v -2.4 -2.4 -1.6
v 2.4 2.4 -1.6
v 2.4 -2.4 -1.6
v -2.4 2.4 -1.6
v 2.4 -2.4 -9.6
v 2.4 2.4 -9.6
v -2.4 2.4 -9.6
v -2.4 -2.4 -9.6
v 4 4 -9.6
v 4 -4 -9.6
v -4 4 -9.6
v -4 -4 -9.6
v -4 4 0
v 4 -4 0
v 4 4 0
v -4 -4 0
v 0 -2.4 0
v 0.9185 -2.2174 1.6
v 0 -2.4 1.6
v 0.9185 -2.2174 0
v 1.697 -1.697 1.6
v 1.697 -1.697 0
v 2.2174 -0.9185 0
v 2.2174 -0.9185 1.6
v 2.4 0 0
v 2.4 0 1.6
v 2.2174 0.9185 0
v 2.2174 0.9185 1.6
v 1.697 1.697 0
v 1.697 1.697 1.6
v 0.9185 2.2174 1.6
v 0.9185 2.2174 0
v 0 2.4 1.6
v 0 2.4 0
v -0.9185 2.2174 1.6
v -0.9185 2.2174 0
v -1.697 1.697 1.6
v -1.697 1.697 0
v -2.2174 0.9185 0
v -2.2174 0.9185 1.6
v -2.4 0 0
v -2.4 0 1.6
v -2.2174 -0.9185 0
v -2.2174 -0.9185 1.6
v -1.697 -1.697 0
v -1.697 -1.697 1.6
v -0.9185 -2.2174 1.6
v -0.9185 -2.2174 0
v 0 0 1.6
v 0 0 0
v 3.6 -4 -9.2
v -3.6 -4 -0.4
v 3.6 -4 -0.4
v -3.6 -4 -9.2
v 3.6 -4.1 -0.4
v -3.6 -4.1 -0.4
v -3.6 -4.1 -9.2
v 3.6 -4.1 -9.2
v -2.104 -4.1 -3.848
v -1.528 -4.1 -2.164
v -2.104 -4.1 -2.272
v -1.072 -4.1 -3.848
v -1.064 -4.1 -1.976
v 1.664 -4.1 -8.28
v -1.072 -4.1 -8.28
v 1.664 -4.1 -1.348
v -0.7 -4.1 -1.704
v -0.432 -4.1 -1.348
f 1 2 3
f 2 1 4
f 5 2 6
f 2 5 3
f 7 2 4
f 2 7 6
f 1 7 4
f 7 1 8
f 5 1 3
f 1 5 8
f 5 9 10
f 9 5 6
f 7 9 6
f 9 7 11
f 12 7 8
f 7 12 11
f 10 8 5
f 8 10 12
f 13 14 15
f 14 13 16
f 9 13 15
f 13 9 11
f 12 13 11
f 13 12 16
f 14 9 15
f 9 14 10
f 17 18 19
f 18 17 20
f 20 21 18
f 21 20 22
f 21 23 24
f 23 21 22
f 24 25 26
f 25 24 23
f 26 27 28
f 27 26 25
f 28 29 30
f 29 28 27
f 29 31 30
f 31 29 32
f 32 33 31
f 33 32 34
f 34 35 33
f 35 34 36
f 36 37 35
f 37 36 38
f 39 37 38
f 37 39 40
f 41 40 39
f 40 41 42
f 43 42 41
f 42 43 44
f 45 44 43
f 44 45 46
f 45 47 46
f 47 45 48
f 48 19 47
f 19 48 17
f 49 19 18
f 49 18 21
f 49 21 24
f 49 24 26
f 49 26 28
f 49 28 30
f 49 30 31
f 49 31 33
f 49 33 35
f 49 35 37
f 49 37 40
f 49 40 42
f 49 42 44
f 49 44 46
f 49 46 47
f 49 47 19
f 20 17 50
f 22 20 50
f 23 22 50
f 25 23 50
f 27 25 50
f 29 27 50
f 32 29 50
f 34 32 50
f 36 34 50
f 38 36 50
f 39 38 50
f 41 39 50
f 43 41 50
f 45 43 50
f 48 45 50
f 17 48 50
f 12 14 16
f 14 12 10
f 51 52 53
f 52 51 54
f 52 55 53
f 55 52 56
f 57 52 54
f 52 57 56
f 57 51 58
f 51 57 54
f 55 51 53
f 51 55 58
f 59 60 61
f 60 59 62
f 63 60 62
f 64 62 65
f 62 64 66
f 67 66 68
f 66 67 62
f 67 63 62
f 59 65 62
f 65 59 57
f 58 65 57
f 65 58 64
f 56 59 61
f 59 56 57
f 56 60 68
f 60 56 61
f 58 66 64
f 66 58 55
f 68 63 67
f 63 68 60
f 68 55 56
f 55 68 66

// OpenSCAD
// file: ../p/4-4edge.scad
use <../lib.scad>
function ldraw_lib__4_4edge() = [
// 0 Circle 1.0
// 0 Name: 4-4edge.dat
// 0 Author: James Jessiman
// 0 !LDRAW_ORG Primitive UPDATE 2017-01
// 0 !LICENSE Licensed under CC BY 2.0 and CC BY 4.0 : see CAreadme.txt
// 
// 0 BFC CERTIFY CCW
  [0,"BFC","CERTIFY"],
  [0,"BFC","CCW"],
// 
// 0 !HISTORY 1998-12-15 [PTadmin] Official Update 1998-10
// 0 !HISTORY 2005-12-28 [PTadmin] Official Update 2005-01
// 0 !HISTORY 2007-06-24 [PTadmin] Header formatted for Contributor Agreement
// 0 !HISTORY 2008-07-01 [PTadmin] Official Update 2008-01
// 0 !HISTORY 2017-01-15 [Steffen] BFCed
// 0 !HISTORY 2017-12-30 [PTadmin] Official Update 2017-01
// 
// 
// 2 24 1 0 0 0.9239 0 0.3827
  [2,24,1,0,0,0.9239,0,0.3827],
// 2 24 0.9239 0 0.3827 0.7071 0 0.7071
  [2,24,0.9239,0,0.3827,0.7071,0,0.7071],
// 2 24 0.7071 0 0.7071 0.3827 0 0.9239
  [2,24,0.7071,0,0.7071,0.3827,0,0.9239],
// 2 24 0.3827 0 0.9239 0 0 1
  [2,24,0.3827,0,0.9239,0,0,1],
// 2 24 0 0 1 -0.3827 0 0.9239
  [2,24,0,0,1,-0.3827,0,0.9239],
// 2 24 -0.3827 0 0.9239 -0.7071 0 0.7071
  [2,24,-0.3827,0,0.9239,-0.7071,0,0.7071],
// 2 24 -0.7071 0 0.7071 -0.9239 0 0.3827
  [2,24,-0.7071,0,0.7071,-0.9239,0,0.3827],
// 2 24 -0.9239 0 0.3827 -1 0 -0
  [2,24,-0.9239,0,0.3827,-1,0,-0],
// 2 24 -1 0 -0 -0.9239 0 -0.3827
  [2,24,-1,0,-0,-0.9239,0,-0.3827],
// 2 24 -0.9239 0 -0.3827 -0.7071 0 -0.7071
  [2,24,-0.9239,0,-0.3827,-0.7071,0,-0.7071],
// 2 24 -0.7071 0 -0.7071 -0.3827 0 -0.9239
  [2,24,-0.7071,0,-0.7071,-0.3827,0,-0.9239],
// 2 24 -0.3827 0 -0.9239 0 0 -1
  [2,24,-0.3827,0,-0.9239,0,0,-1],
// 2 24 0 0 -1 0.3827 0 -0.9239
  [2,24,0,0,-1,0.3827,0,-0.9239],
// 2 24 0.3827 0 -0.9239 0.7071 0 -0.7071
  [2,24,0.3827,0,-0.9239,0.7071,0,-0.7071],
// 2 24 0.7071 0 -0.7071 0.9239 0 -0.3827
  [2,24,0.7071,0,-0.7071,0.9239,0,-0.3827],
// 2 24 0.9239 0 -0.3827 1 0 0
  [2,24,0.9239,0,-0.3827,1,0,0],
];
module ldraw_lib__4_4edge(step=0, col=false, unit=2/5, alt=false, line=0.2, solid=!$preview)
    makepoly(ldraw_lib__4_4edge(), step=step, col=col, unit=unit, alt=alt, line=line, solid=solid);
ldraw_lib__4_4edge(line=0.2);
// file: ../p/4-4disc.scad
use <../lib.scad>
function ldraw_lib__4_4disc() = [
// 0 Disc 1.0
// 0 Name: 4-4disc.dat
// 0 Author: James Jessiman
// 0 !LDRAW_ORG Primitive UPDATE 2002-02
// 0 !LICENSE Licensed under CC BY 2.0 and CC BY 4.0 : see CAreadme.txt
// 
// 0 BFC CERTIFY CCW
  [0,"BFC","CERTIFY"],
  [0,"BFC","CCW"],
// 
// 0 !HISTORY 1998-12-15 [PTadmin] Official Update 1998-10
// 0 !HISTORY 2002-03-23 [sbliss] Added BFC statement
// 0 !HISTORY 2002-04-25 [PTadmin] Official Update 2002-02
// 0 !HISTORY 2007-06-24 [PTadmin] Header formatted for Contributor Agreement
// 0 !HISTORY 2008-07-01 [PTadmin] Official Update 2008-01
// 
// 
// 3 16 0 0 0 1 0 0 0.9239 0 0.3827
  [3,16,0,0,0,1,0,0,0.9239,0,0.3827],
// 3 16 0 0 0 0.9239 0 0.3827 0.7071 0 0.7071
  [3,16,0,0,0,0.9239,0,0.3827,0.7071,0,0.7071],
// 3 16 0 0 0 0.7071 0 0.7071 0.3827 0 0.9239
  [3,16,0,0,0,0.7071,0,0.7071,0.3827,0,0.9239],
// 3 16 0 0 0 0.3827 0 0.9239 0 0 1
  [3,16,0,0,0,0.3827,0,0.9239,0,0,1],
// 3 16 0 0 0 0 0 1 -0.3827 0 0.9239
  [3,16,0,0,0,0,0,1,-0.3827,0,0.9239],
// 3 16 0 0 0 -0.3827 0 0.9239 -0.7071 0 0.7071
  [3,16,0,0,0,-0.3827,0,0.9239,-0.7071,0,0.7071],
// 3 16 0 0 0 -0.7071 0 0.7071 -0.9239 0 0.3827
  [3,16,0,0,0,-0.7071,0,0.7071,-0.9239,0,0.3827],
// 3 16 0 0 0 -0.9239 0 0.3827 -1 0 -0
  [3,16,0,0,0,-0.9239,0,0.3827,-1,0,-0],
// 3 16 0 0 0 -1 0 -0 -0.9239 0 -0.3827
  [3,16,0,0,0,-1,0,-0,-0.9239,0,-0.3827],
// 3 16 0 0 0 -0.9239 0 -0.3827 -0.7071 0 -0.7071
  [3,16,0,0,0,-0.9239,0,-0.3827,-0.7071,0,-0.7071],
// 3 16 0 0 0 -0.7071 0 -0.7071 -0.3827 0 -0.9239
  [3,16,0,0,0,-0.7071,0,-0.7071,-0.3827,0,-0.9239],
// 3 16 0 0 0 -0.3827 0 -0.9239 0 0 -1
  [3,16,0,0,0,-0.3827,0,-0.9239,0,0,-1],
// 3 16 0 0 0 0 0 -1 0.3827 0 -0.9239
  [3,16,0,0,0,0,0,-1,0.3827,0,-0.9239],
// 3 16 0 0 0 0.3827 0 -0.9239 0.7071 0 -0.7071
  [3,16,0,0,0,0.3827,0,-0.9239,0.7071,0,-0.7071],
// 3 16 0 0 0 0.7071 0 -0.7071 0.9239 0 -0.3827
  [3,16,0,0,0,0.7071,0,-0.7071,0.9239,0,-0.3827],
// 3 16 0 0 0 0.9239 0 -0.3827 1 0 0
  [3,16,0,0,0,0.9239,0,-0.3827,1,0,0],
// 0
];
module ldraw_lib__4_4disc(step=0, col=false, unit=2/5, alt=false, line=0.2, solid=!$preview)
    makepoly(ldraw_lib__4_4disc(), step=step, col=col, unit=unit, alt=alt, line=line, solid=solid);
ldraw_lib__4_4disc(line=0.2);
// file: ../p/4-4cyli.scad
use <../lib.scad>
$fa=1; $fs=0.2;
function ldraw_lib__4_4cyli(realsolid=false) = [
// 0 Cylinder 1.0
// 0 Name: 4-4cyli.dat
// 0 Author: James Jessiman
// 0 !LDRAW_ORG Primitive UPDATE 2005-01
// 0 !LICENSE Licensed under CC BY 2.0 and CC BY 4.0 : see CAreadme.txt
// 
// 0 BFC CERTIFY CCW
  [0,"BFC","CERTIFY"],
  [0,"BFC","CCW"],
// 
// 0 !HISTORY 1998-12-15 [PTadmin] Official Update 1998-10
// 0 !HISTORY 2002-03-23 [sbliss] Added BFC statement; merged headers from files in distributions LDraw 0.27 and Complete.
// 0 !HISTORY 2002-04-25 [PTadmin] Official Update 2002-02
// 0 !HISTORY 2004-12-14 [guyvivan] BFC CCW
// 0 !HISTORY 2005-12-28 [PTadmin] Official Update 2005-01
// 0 !HISTORY 2007-06-24 [PTadmin] Header formatted for Contributor Agreement
// 0 !HISTORY 2008-07-01 [PTadmin] Official Update 2008-01
// 
// 
// 4 16 1 1 0 0.9239 1 0.3827 0.9239 0 0.3827 1 0 0
  [4,16,1,1,0,0.9239,1,0.3827,0.9239,0,0.3827,1,0,0],
// 5 24 1 0 0 1 1 0 0.9239 0 0.3827 0.9239 0 -0.3827
  [5,24,1,0,0,1,1,0,0.9239,0,0.3827,0.9239,0,-0.3827],
// 4 16 0.9239 1 0.3827 0.7071 1 0.7071 0.7071 0 0.7071 0.9239 0 0.3827
  [4,16,0.9239,1,0.3827,0.7071,1,0.7071,0.7071,0,0.7071,0.9239,0,0.3827],
// 5 24 0.9239 0 0.3827 0.9239 1 0.3827 0.7071 0 0.7071 1 0 0
  [5,24,0.9239,0,0.3827,0.9239,1,0.3827,0.7071,0,0.7071,1,0,0],
// 4 16 0.7071 1 0.7071 0.3827 1 0.9239 0.3827 0 0.9239 0.7071 0 0.7071
  [4,16,0.7071,1,0.7071,0.3827,1,0.9239,0.3827,0,0.9239,0.7071,0,0.7071],
// 5 24 0.7071 0 0.7071 0.7071 1 0.7071 0.3827 0 0.9239 0.9239 0 0.3827
  [5,24,0.7071,0,0.7071,0.7071,1,0.7071,0.3827,0,0.9239,0.9239,0,0.3827],
// 4 16 0.3827 1 0.9239 0 1 1 0 0 1 0.3827 0 0.9239
  [4,16,0.3827,1,0.9239,0,1,1,0,0,1,0.3827,0,0.9239],
// 5 24 0.3827 0 0.9239 0.3827 1 0.9239 0 0 1 0.7071 0 0.7071
  [5,24,0.3827,0,0.9239,0.3827,1,0.9239,0,0,1,0.7071,0,0.7071],
// 4 16 0 1 1 -0.3827 1 0.9239 -0.3827 0 0.9239 0 0 1
  [4,16,0,1,1,-0.3827,1,0.9239,-0.3827,0,0.9239,0,0,1],
// 5 24 0 0 1 0 1 1 -0.3827 0 0.9239 0.3827 0 0.9239
  [5,24,0,0,1,0,1,1,-0.3827,0,0.9239,0.3827,0,0.9239],
// 4 16 -0.3827 1 0.9239 -0.7071 1 0.7071 -0.7071 0 0.7071 -0.3827 0 0.9239
  [4,16,-0.3827,1,0.9239,-0.7071,1,0.7071,-0.7071,0,0.7071,-0.3827,0,0.9239],
// 5 24 -0.3827 0 0.9239 -0.3827 1 0.9239 -0.7071 0 0.7071 0 0 1
  [5,24,-0.3827,0,0.9239,-0.3827,1,0.9239,-0.7071,0,0.7071,0,0,1],
// 4 16 -0.7071 1 0.7071 -0.9239 1 0.3827 -0.9239 0 0.3827 -0.7071 0 0.7071
  [4,16,-0.7071,1,0.7071,-0.9239,1,0.3827,-0.9239,0,0.3827,-0.7071,0,0.7071],
// 5 24 -0.7071 0 0.7071 -0.7071 1 0.7071 -0.9239 0 0.3827 -0.3827 0 0.9239
  [5,24,-0.7071,0,0.7071,-0.7071,1,0.7071,-0.9239,0,0.3827,-0.3827,0,0.9239],
// 4 16 -0.9239 1 0.3827 -1 1 0 -1 0 0 -0.9239 0 0.3827
  [4,16,-0.9239,1,0.3827,-1,1,0,-1,0,0,-0.9239,0,0.3827],
// 5 24 -0.9239 0 0.3827 -0.9239 1 0.3827 -1 0 0 -0.7071 0 0.7071
  [5,24,-0.9239,0,0.3827,-0.9239,1,0.3827,-1,0,0,-0.7071,0,0.7071],
// 4 16 -1 1 0 -0.9239 1 -0.3827 -0.9239 0 -0.3827 -1 0 0
  [4,16,-1,1,0,-0.9239,1,-0.3827,-0.9239,0,-0.3827,-1,0,0],
// 5 24 -1 0 0 -1 1 0 -0.9239 0 -0.3827 -0.9239 0 0.3827
  [5,24,-1,0,0,-1,1,0,-0.9239,0,-0.3827,-0.9239,0,0.3827],
// 4 16 -0.9239 1 -0.3827 -0.7071 1 -0.7071 -0.7071 0 -0.7071 -0.9239 0 -0.3827
  [4,16,-0.9239,1,-0.3827,-0.7071,1,-0.7071,-0.7071,0,-0.7071,-0.9239,0,-0.3827],
// 5 24 -0.9239 0 -0.3827 -0.9239 1 -0.3827 -0.7071 0 -0.7071 -1 0 0
  [5,24,-0.9239,0,-0.3827,-0.9239,1,-0.3827,-0.7071,0,-0.7071,-1,0,0],
// 4 16 -0.7071 1 -0.7071 -0.3827 1 -0.9239 -0.3827 0 -0.9239 -0.7071 0 -0.7071
  [4,16,-0.7071,1,-0.7071,-0.3827,1,-0.9239,-0.3827,0,-0.9239,-0.7071,0,-0.7071],
// 5 24 -0.7071 0 -0.7071 -0.7071 1 -0.7071 -0.3827 0 -0.9239 -0.9239 0 -0.3827
  [5,24,-0.7071,0,-0.7071,-0.7071,1,-0.7071,-0.3827,0,-0.9239,-0.9239,0,-0.3827],
// 4 16 -0.3827 1 -0.9239 0 1 -1 0 0 -1 -0.3827 0 -0.9239
  [4,16,-0.3827,1,-0.9239,0,1,-1,0,0,-1,-0.3827,0,-0.9239],
// 5 24 -0.3827 0 -0.9239 -0.3827 1 -0.9239 0 0 -1 -0.7071 0 -0.7071
  [5,24,-0.3827,0,-0.9239,-0.3827,1,-0.9239,0,0,-1,-0.7071,0,-0.7071],
// 4 16 0 1 -1 0.3827 1 -0.9239 0.3827 0 -0.9239 0 0 -1
  [4,16,0,1,-1,0.3827,1,-0.9239,0.3827,0,-0.9239,0,0,-1],
// 5 24 0 0 -1 0 1 -1 0.3827 0 -0.9239 -0.3827 0 -0.9239
  [5,24,0,0,-1,0,1,-1,0.3827,0,-0.9239,-0.3827,0,-0.9239],
// 4 16 0.3827 1 -0.9239 0.7071 1 -0.7071 0.7071 0 -0.7071 0.3827 0 -0.9239
  [4,16,0.3827,1,-0.9239,0.7071,1,-0.7071,0.7071,0,-0.7071,0.3827,0,-0.9239],
// 5 24 0.3827 0 -0.9239 0.3827 1 -0.9239 0.7071 0 -0.7071 0 0 -1
  [5,24,0.3827,0,-0.9239,0.3827,1,-0.9239,0.7071,0,-0.7071,0,0,-1],
// 4 16 0.7071 1 -0.7071 0.9239 1 -0.3827 0.9239 0 -0.3827 0.7071 0 -0.7071
  [4,16,0.7071,1,-0.7071,0.9239,1,-0.3827,0.9239,0,-0.3827,0.7071,0,-0.7071],
// 5 24 0.7071 0 -0.7071 0.7071 1 -0.7071 0.9239 0 -0.3827 0.3827 0 -0.9239
  [5,24,0.7071,0,-0.7071,0.7071,1,-0.7071,0.9239,0,-0.3827,0.3827,0,-0.9239],
// 4 16 0.9239 1 -0.3827 1 1 0 1 0 0 0.9239 0 -0.3827
  [4,16,0.9239,1,-0.3827,1,1,0,1,0,0,0.9239,0,-0.3827],
// 5 24 0.9239 0 -0.3827 0.9239 1 -0.3827 1 0 0 0.7071 0 -0.7071
  [5,24,0.9239,0,-0.3827,0.9239,1,-0.3827,1,0,0,0.7071,0,-0.7071],
// 0
];
module ldraw_lib__4_4cyli(step=0, col=false, unit=2/5, alt=false, line=0.2, solid=!$preview)
    makepoly(ldraw_lib__4_4cyli(solid), step=step, col=col, unit=unit, alt=alt, line=line, solid=solid);
ldraw_lib__4_4cyli(line=0.2);
// file: ../p/stud.scad
use <../lib.scad>
use <4-4cyli.scad>
use <4-4disc.scad>
use <4-4edge.scad>
function ldraw_lib__stud() = [
// 0 Stud
// 0 Name: stud.dat
// 0 Author: James Jessiman
// 0 !LDRAW_ORG Primitive UPDATE 2012-01
// 0 !LICENSE Licensed under CC BY 4.0 : see CAreadme.txt
// 
// 0 BFC CERTIFY CCW
  [0,"BFC","CERTIFY"],
  [0,"BFC","CCW"],
// 
// 0 !HISTORY 2002-04-04 [sbliss] Modified for BFC compliance
// 0 !HISTORY 2002-04-25 [PTadmin] Official Update 2002-02
// 0 !HISTORY 2007-06-24 [PTadmin] Header formatted for Contributor Agreement
// 0 !HISTORY 2008-07-01 [PTadmin] Official Update 2008-01
// 0 !HISTORY 2012-02-16 [Philo] Changed to CCW
// 0 !HISTORY 2012-03-30 [PTadmin] Official Update 2012-01
// 
// 
// 1 16 0 0 0 6 0 0 0 1 0 0 0 6 4-4edge.dat
  [1,16,0,0,0,6,0,0,0,1,0,0,0,6, ldraw_lib__4_4edge()],
// 1 16 0 -4 0 6 0 0 0 1 0 0 0 6 4-4edge.dat
  [1,16,0,-4,0,6,0,0,0,1,0,0,0,6, ldraw_lib__4_4edge()],
// 1 16 0 0 0 6 0 0 0 -4 0 0 0 6 4-4cyli.dat
  [1,16,0,0,0,6,0,0,0,-4,0,0,0,6, ldraw_lib__4_4cyli()],
// 1 16 0 -4 0 6 0 0 0 1 0 0 0 6 4-4disc.dat
  [1,16,0,-4,0,6,0,0,0,1,0,0,0,6, ldraw_lib__4_4disc()],
  [-1,16,0,0,0,6,0,0,0,-1,0,0,0,6, ldraw_lib__4_4disc()],
];
module ldraw_lib__stud(step=0, col=false, unit=2/5, alt=false, line=0.2, solid=!$preview)
    makepoly(ldraw_lib__stud(), step=step, col=col, unit=unit, alt=alt, line=line, solid=solid);
ldraw_lib__stud(line=0.2);
// file: ../p/box5.scad
use <../lib.scad>
function ldraw_lib__box5() = [
// 0 Box with 5 Faces and All Edges
// 0 Name: box5.dat
// 0 Author: James Jessiman
// 0 !LDRAW_ORG Primitive UPDATE 2012-01
// 0 !LICENSE Licensed under CC BY 2.0 and CC BY 4.0 : see CAreadme.txt
// 
// 0 BFC CERTIFY CCW
  [0,"BFC","CERTIFY"],
  [0,"BFC","CCW"],
// 
// 0 !HISTORY 2002-04-03 [sbliss] Modified for BFC compliance
// 0 !HISTORY 2002-04-25 [PTadmin] Official Update 2002-02
// 0 !HISTORY 2007-06-24 [PTadmin] Header formatted for Contributor Agreement
// 0 !HISTORY 2008-07-01 [PTadmin] Official Update 2008-01
// 0 !HISTORY 2012-02-16 [Philo] Changed to CCW
// 0 !HISTORY 2012-03-30 [PTadmin] Official Update 2012-01
// 
// 
// 2 24 1 1 1 -1 1 1
  [2,24,1,1,1,-1,1,1],
// 2 24 -1 1 1 -1 1 -1
  [2,24,-1,1,1,-1,1,-1],
// 2 24 -1 1 -1 1 1 -1
  [2,24,-1,1,-1,1,1,-1],
// 2 24 1 1 -1 1 1 1
  [2,24,1,1,-1,1,1,1],
// 2 24 1 0 1 -1 0 1
  [2,24,1,0,1,-1,0,1],
// 2 24 -1 0 1 -1 0 -1
  [2,24,-1,0,1,-1,0,-1],
// 2 24 -1 0 -1 1 0 -1
  [2,24,-1,0,-1,1,0,-1],
// 2 24 1 0 -1 1 0 1
  [2,24,1,0,-1,1,0,1],
// 2 24 1 0 1 1 1 1
  [2,24,1,0,1,1,1,1],
// 2 24 -1 0 1 -1 1 1
  [2,24,-1,0,1,-1,1,1],
// 2 24 1 0 -1 1 1 -1
  [2,24,1,0,-1,1,1,-1],
// 2 24 -1 0 -1 -1 1 -1
  [2,24,-1,0,-1,-1,1,-1],
// 4 16 -1 1 1 1 1 1 1 1 -1 -1 1 -1
  [4,16,-1,1,1,1,1,1,1,1,-1,-1,1,-1],
// 4 16 -1 1 1 -1 0 1 1 0 1 1 1 1
  [4,16,-1,1,1,-1,0,1,1,0,1,1,1,1],
// 4 16 -1 1 -1 -1 0 -1 -1 0 1 -1 1 1
  [4,16,-1,1,-1,-1,0,-1,-1,0,1,-1,1,1],
// 4 16 1 1 -1 1 0 -1 -1 0 -1 -1 1 -1
  [4,16,1,1,-1,1,0,-1,-1,0,-1,-1,1,-1],
// 4 16 1 1 1 1 0 1 1 0 -1 1 1 -1
  [4,16,1,1,1,1,0,1,1,0,-1,1,1,-1],
];
makepoly(ldraw_lib__box5(), line=0.2);
// file: ../p/box4t.scad
use <../lib.scad>
function ldraw_lib__box4t() = [
// 0 Box with 4 Adjacent Faces and All Edges
// 0 Name: box4t.dat
// 0 Author: Tore Eriksson [Tore_Eriksson]
// 0 !LDRAW_ORG Primitive UPDATE 2003-02
// 0 !LICENSE Licensed under CC BY 2.0 and CC BY 4.0 : see CAreadme.txt
// 
// 0 BFC CERTIFY CCW
  [0,"BFC","CERTIFY"],
  [0,"BFC","CCW"],
// 
// 0 !HISTORY 1997-09-29 [PTadmin] Official Update 1997-15
// 0 !HISTORY 2002-08-31 [izanette] Modified with WINDZ for BFC compliance
// 0 !HISTORY 2003-08-01 [PTadmin] Official Update 2003-02
// 0 !HISTORY 2007-06-24 [PTadmin] Header formatted for Contributor Agreement
// 0 !HISTORY 2008-07-01 [PTadmin] Official Update 2008-01
// 
// 
// 2 24 1 1 1 -1 1 1
  [2,24,1,1,1,-1,1,1],
// 2 24 -1 1 1 -1 1 -1
  [2,24,-1,1,1,-1,1,-1],
// 2 24 -1 1 -1 1 1 -1
  [2,24,-1,1,-1,1,1,-1],
// 2 24 1 1 -1 1 1 1
  [2,24,1,1,-1,1,1,1],
// 2 24 1 0 1 -1 0 1
  [2,24,1,0,1,-1,0,1],
// 2 24 -1 0 1 -1 0 -1
  [2,24,-1,0,1,-1,0,-1],
// 2 24 -1 0 -1 1 0 -1
  [2,24,-1,0,-1,1,0,-1],
// 2 24 1 0 -1 1 0 1
  [2,24,1,0,-1,1,0,1],
// 2 24 1 0 1 1 1 1
  [2,24,1,0,1,1,1,1],
// 2 24 -1 0 1 -1 1 1
  [2,24,-1,0,1,-1,1,1],
// 2 24 1 0 -1 1 1 -1
  [2,24,1,0,-1,1,1,-1],
// 2 24 -1 0 -1 -1 1 -1
  [2,24,-1,0,-1,-1,1,-1],
// 4 16 1 1 1 1 1 -1 -1 1 -1 -1 1 1
  [4,16,1,1,1,1,1,-1,-1,1,-1,-1,1,1],
// 4 16 1 1 1 -1 1 1 -1 0 1 1 0 1
  [4,16,1,1,1,-1,1,1,-1,0,1,1,0,1],
// 4 16 -1 1 1 -1 1 -1 -1 0 -1 -1 0 1
  [4,16,-1,1,1,-1,1,-1,-1,0,-1,-1,0,1],
// 0 4 16 -1 1 -1 -1 0 -1 1 0 -1 1 1 -1
// 4 16 1 1 -1 1 1 1 1 0 1 1 0 -1
  [4,16,1,1,-1,1,1,1,1,0,1,1,0,-1],
// 0
];
makepoly(ldraw_lib__box4t(), line=0.2);
// file: ../p/box5-12.scad
use <../lib.scad>
function ldraw_lib__box5_12() = [
// 0 Box with 5 Faces without Any Edges
// 0 Name: box5-12.dat
// 0 Author: Chris Dee [cwdee]
// 0 !LDRAW_ORG Primitive UPDATE 2009-02
// 0 !LICENSE Licensed under CC BY 2.0 and CC BY 4.0 : see CAreadme.txt
// 
// 0 BFC CERTIFY CCW
  [0,"BFC","CERTIFY"],
  [0,"BFC","CCW"],
// 
// 0 !HISTORY 2009-09-03 [PTadmin] Official Update 2009-02
// 
// 
// 4 16 1 1 1 1 1 -1 -1 1 -1 -1 1 1
  [4,16,1,1,1,1,1,-1,-1,1,-1,-1,1,1],
// 4 16 -1 0 1 1 0 1 1 1 1 -1 1 1
  [4,16,-1,0,1,1,0,1,1,1,1,-1,1,1],
// 4 16 -1 0 -1 -1 0 1 -1 1 1 -1 1 -1
  [4,16,-1,0,-1,-1,0,1,-1,1,1,-1,1,-1],
// 4 16 1 0 -1 -1 0 -1 -1 1 -1 1 1 -1
  [4,16,1,0,-1,-1,0,-1,-1,1,-1,1,1,-1],
// 4 16 1 0 1 1 0 -1 1 1 -1 1 1 1
  [4,16,1,0,1,1,0,-1,1,1,-1,1,1,1],
// 0
];
module ldraw_lib__box5_12(step=0, col=false, unit=2/5, alt=false, line=0.2, solid=!$preview)
    makepoly(ldraw_lib__box5_12(), step=step, col=col, unit=unit, alt=alt, line=line, solid=solid);
ldraw_lib__box5_12(line=0.2);
// file: s/3005s01.scad
use <../../lib.scad>
use <../../p/box4t.scad>
use <../../p/box5.scad>
use <../../p/stud.scad>
function ldraw_lib__s__3005s01() = [
// 0 ~Brick  1 x  1 without Front Face
// 0 Name: s\3005s01.dat
// 0 Author: John Riley [jriley]
// 0 !LDRAW_ORG Subpart UPDATE 2004-01
// 0 !LICENSE Licensed under CC BY 2.0 and CC BY 4.0 : see CAreadme.txt
// 
// 0 BFC CERTIFY CCW
  [0,"BFC","CERTIFY"],
  [0,"BFC","CCW"],
// 
// 0 !HISTORY 2003-09-07 [jriley] BFCed & Subfiled
// 0 !HISTORY 2004-03-02 [PTadmin] Official Update 2004-01
// 0 !HISTORY 2007-08-29 [PTadmin] Header formatted for Contributor Agreement
// 0 !HISTORY 2008-07-01 [PTadmin] Official Update 2008-01
// 
// 
// 0 BFC INVERTNEXT
  [0,"BFC","INVERTNEXT"],
// 1 16 0 24 0 0 0 6 0 -20 0 -6 0 0 box5.dat
  [1,16,0,24,0,0,0,6,0,-20,0,-6,0,0, ldraw_lib__box5()],
// 4 16 10 24 -10 6 24 -6 6 24 6 10 24 10
  [4,16,10,24,-10,6,24,-6,6,24,6,10,24,10],
// 4 16 10 24 10 6 24 6 -6 24 6 -10 24 10
  [4,16,10,24,10,6,24,6,-6,24,6,-10,24,10],
// 4 16 -10 24 10 -6 24 6 -6 24 -6 -10 24 -10
  [4,16,-10,24,10,-6,24,6,-6,24,-6,-10,24,-10],
// 4 16 -10 24 -10 -6 24 -6 6 24 -6 10 24 -10
  [4,16,-10,24,-10,-6,24,-6,6,24,-6,10,24,-10],
// 1 16 0 24 0 10 0 0 0 -24 0 0 0 10 box4t.dat
  [1,16,0,24,0,10,0,0,0,-24,0,0,0,10, ldraw_lib__box4t()],
// 1 16 0 0 0 0 0 1 0 1 0 -1 0 0 stud.dat
  [1,16,0,0,0,0,0,1,0,1,0,-1,0,0, ldraw_lib__stud()],
// 0
];
module ldraw_lib__s__3005s01(step=0, col=false, unit=2/5, alt=false, line=0.2, solid=!$preview)
    makepoly(ldraw_lib__s__3005s01(), step=step, col=col, unit=unit, alt=alt, line=line, solid=solid);
ldraw_lib__s__3005s01(line=0.2);
// file: 820672h.scad
use <../lib.scad>
use <../p/box5-12.scad>
$fa=1; $fs=0.2;
function ldraw_lib__820672h(realsolid=false) = [
// 0 Sticker  1.1 x  0.9 with Black Bold "1" on White Background
// 0 Name: 820672h.dat
// 0 Author: Takeshi Takahashi [RainbowDolphin]
// 0 !LDRAW_ORG Part UPDATE 2022-05
// 0 !LICENSE Licensed under CC BY 2.0 and CC BY 4.0 : see CAreadme.txt
// 
// 0 BFC CERTIFY CCW
  [0,"BFC","CERTIFY"],
  [0,"BFC","CCW"],
// 
// 0 !KEYWORDS harbour, Pier, Seaport, Set 6541, wharf
// 
// 0 !HISTORY 2022-09-15 [PTadmin] Official Update 2022-05
// 
// 
// 1 16 0 -0.25 0 9 0 0 0 0.25 0 0 0 11 box5-12.dat
  [1,16,0,-0.25,0,9,0,0,0,0.25,0,0,0,11, ldraw_lib__box5_12(realsolid)],
// 4 0 -3.82 -0.25 6.59 -5.26 -0.25 6.32 -5.26 -0.25 2.38 -2.68 -0.25 2.38
  [4,0,-3.82,-0.25,6.59,-5.26,-0.25,6.32,-5.26,-0.25,2.38,-2.68,-0.25,2.38],
// 3 0 -2.66 -0.25 7.06 -3.82 -0.25 6.59 -2.68 -0.25 2.38
  [3,0,-2.66,-0.25,7.06,-3.82,-0.25,6.59,-2.68,-0.25,2.38],
// 4 0 -2.68 -0.25 2.38 -2.68 -0.25 -8.7 4.16 -0.25 -8.7 4.16 -0.25 8.63
  [4,0,-2.68,-0.25,2.38,-2.68,-0.25,-8.7,4.16,-0.25,-8.7,4.16,-0.25,8.63],
// 4 0 -1.75 -0.25 7.74 -2.68 -0.25 2.38 4.16 -0.25 8.63 -1.08 -0.25 8.63
  [4,0,-1.75,-0.25,7.74,-2.68,-0.25,2.38,4.16,-0.25,8.63,-1.08,-0.25,8.63],
// 3 0 -1.75 -0.25 7.74 -2.66 -0.25 7.06 -2.68 -0.25 2.38
  [3,0,-1.75,-0.25,7.74,-2.66,-0.25,7.06,-2.68,-0.25,2.38],
// 4 15 -5.26 -0.25 2.38 -9 -0.25 -11 -2.68 -0.25 -8.7 -2.68 -0.25 2.38
  [4,15,-5.26,-0.25,2.38,-9,-0.25,-11,-2.68,-0.25,-8.7,-2.68,-0.25,2.38],
// 4 15 -2.68 -0.25 -8.7 -9 -0.25 -11 9 -0.25 -11 4.16 -0.25 -8.7
  [4,15,-2.68,-0.25,-8.7,-9,-0.25,-11,9,-0.25,-11,4.16,-0.25,-8.7],
// 4 15 -9 -0.25 11 -9 -0.25 -11 -5.26 -0.25 2.38 -5.26 -0.25 6.32
  [4,15,-9,-0.25,11,-9,-0.25,-11,-5.26,-0.25,2.38,-5.26,-0.25,6.32],
// 4 15 -1.08 -0.25 8.63 -9 -0.25 11 -5.26 -0.25 6.32 -3.82 -0.25 6.59
  [4,15,-1.08,-0.25,8.63,-9,-0.25,11,-5.26,-0.25,6.32,-3.82,-0.25,6.59],
// 4 15 4.16 -0.25 8.63 4.16 -0.25 -8.7 9 -0.25 -11 9 -0.25 11
  [4,15,4.16,-0.25,8.63,4.16,-0.25,-8.7,9,-0.25,-11,9,-0.25,11],
// 4 15 -2.66 -0.25 7.06 -1.75 -0.25 7.74 -1.08 -0.25 8.63 -3.82 -0.25 6.59
  [4,15,-2.66,-0.25,7.06,-1.75,-0.25,7.74,-1.08,-0.25,8.63,-3.82,-0.25,6.59],
// 4 15 -1.08 -0.25 8.63 4.16 -0.25 8.63 9 -0.25 11 -9 -0.25 11
  [4,15,-1.08,-0.25,8.63,4.16,-0.25,8.63,9,-0.25,11,-9,-0.25,11],
];
module ldraw_lib__820672h(step=0, col=false, unit=2/5, alt=false, line=0.2, solid=!$preview)
    makepoly(ldraw_lib__820672h(solid), step=step, col=col, unit=unit, alt=alt, line=line, solid=solid);
ldraw_lib__820672h(line=0.2);
// file: 3005.scad
use <../lib.scad>
use <s/3005s01.scad>
function ldraw_lib__3005() = [
// 0 Brick  1 x  1
// 0 Name: 3005.dat
// 0 Author: James Jessiman
// 0 !LDRAW_ORG Part UPDATE 2022-05
// 0 !LICENSE Licensed under CC BY 2.0 and CC BY 4.0 : see CAreadme.txt
// 
// 0 BFC CERTIFY CCW
  [0,"BFC","CERTIFY"],
  [0,"BFC","CCW"],
// 
// 0 !HISTORY 2001-10-26 [PTadmin] Official Update 2001-01
// 0 !HISTORY 2002-05-07 {unknown} BFC Certification
// 0 !HISTORY 2002-06-11 [PTadmin] Official Update 2002-03
// 0 !HISTORY 2007-05-07 [PTadmin] Header formatted for Contributor Agreement
// 0 !HISTORY 2008-07-01 [PTadmin] Official Update 2008-01
// 0 !HISTORY 2022-08-04 [MagFors] Using subfile
// 0 !HISTORY 2022-09-15 [PTadmin] Official Update 2022-05
// 
// 
// 1 16 0 0 0 1 0 0 0 1 0 0 0 1 s\3005s01.dat
  [1,16,0,0,0,1,0,0,0,1,0,0,0,1, ldraw_lib__s__3005s01()],
// 4 16 -10 24 -10 10 24 -10 10 0 -10 -10 0 -10
  [4,16,-10,24,-10,10,24,-10,10,0,-10,-10,0,-10],
];
module ldraw_lib__3005(step=0, col=false, unit=2/5, alt=false, line=0.2, solid=!$preview)
    makepoly(ldraw_lib__3005(), step=step, col=col, unit=unit, alt=alt, line=line, solid=solid);
ldraw_lib__3005(line=0.2);
// main file
use <../lib.scad>
use <3005.scad>
use <820672h.scad>
function ldraw_lib__3005d07() = [
// 0 Brick  1 x  1 with Black "1" Sticker
// 0 Name: 3005d07.dat
// 0 Author: Takeshi Takahashi [RainbowDolphin]
// 0 !LDRAW_ORG Shortcut UPDATE 2024-07
// 0 !LICENSE Licensed under CC BY 4.0 : see CAreadme.txt
// 
// 0 BFC CERTIFY CCW
  [0,"BFC","CERTIFY"],
  [0,"BFC","CCW"],
// 
// 0 !CATEGORY Sticker Shortcut
// 0 !KEYWORDS Bricklink 3005pb005, Intercoastal Seaport, Set 6541
// 
// 0 !HISTORY 2024-08-26 [OrionP] Official Update 2024-07
// 
// 1 16 0 0 0 1 0 0 0 1 0 0 0 1 3005.dat
  [1,16,0,0,0,1,0,0,0,1,0,0,0,1, ldraw_lib__3005()],
// 1 16 0 12 -10 1 0 0 0 0 -1 0 1 0 820672h.dat
  [1,16,0,12,-10,1,0,0,0,0,-1,0,1,0, ldraw_lib__820672h()],
];
module ldraw_lib__3005d07(step=0, col=false, unit=2/5, alt=false, line=0.2, solid=!$preview)
    makepoly(ldraw_lib__3005d07(), step=step, col=col, unit=unit, alt=alt, line=line, solid=solid);
ldraw_lib__3005d07(line=0.2);
